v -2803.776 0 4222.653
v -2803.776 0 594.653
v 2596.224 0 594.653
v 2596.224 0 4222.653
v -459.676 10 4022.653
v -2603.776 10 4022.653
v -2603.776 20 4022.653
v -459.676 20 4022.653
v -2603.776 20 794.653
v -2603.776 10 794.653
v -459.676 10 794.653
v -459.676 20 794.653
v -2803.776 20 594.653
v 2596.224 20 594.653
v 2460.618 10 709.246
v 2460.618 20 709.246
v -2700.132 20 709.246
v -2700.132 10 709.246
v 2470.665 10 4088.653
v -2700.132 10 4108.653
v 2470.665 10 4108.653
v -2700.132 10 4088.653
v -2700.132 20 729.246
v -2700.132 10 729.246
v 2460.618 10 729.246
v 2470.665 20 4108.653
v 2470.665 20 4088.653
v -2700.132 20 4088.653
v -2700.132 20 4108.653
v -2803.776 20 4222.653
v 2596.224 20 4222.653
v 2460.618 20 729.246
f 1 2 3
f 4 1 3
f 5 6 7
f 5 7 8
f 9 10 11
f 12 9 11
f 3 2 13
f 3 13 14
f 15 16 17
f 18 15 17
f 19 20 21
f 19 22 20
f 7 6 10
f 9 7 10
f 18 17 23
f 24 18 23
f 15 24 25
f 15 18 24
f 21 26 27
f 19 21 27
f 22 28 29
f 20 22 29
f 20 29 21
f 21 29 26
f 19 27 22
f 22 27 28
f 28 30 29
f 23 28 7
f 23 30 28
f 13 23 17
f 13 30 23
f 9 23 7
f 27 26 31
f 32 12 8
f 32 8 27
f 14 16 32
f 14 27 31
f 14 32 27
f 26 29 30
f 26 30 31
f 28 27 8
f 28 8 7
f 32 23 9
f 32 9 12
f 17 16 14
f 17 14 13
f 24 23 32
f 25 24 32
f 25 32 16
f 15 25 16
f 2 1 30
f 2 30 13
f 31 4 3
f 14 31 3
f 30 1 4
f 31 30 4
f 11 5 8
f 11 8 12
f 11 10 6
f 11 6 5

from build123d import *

# Parameters (mm, degrees)
SKETCH1_W           = 5400
SKETCH1_H           = 3628
SKETCH1_W_2         = 2144.1
SKETCH1_H_2         = 3228
BOSS_EXTRUDE1_DEPTH = 20
SKETCH4_W           = 2144.1
SKETCH4_H           = 3228
BOSS_EXTRUDE2_DEPTH = 10
CUT_EXTRUDE1_DEPTH  = 10


with BuildPart() as part:
    # Sketch1 → Boss-Extrude1 (new body)
    with BuildSketch(Plane(origin=(0, 0, 0), x_dir=(1, 0, 0), z_dir=(0, 1, 0))):
        with Locations((-103.776435045, -2408.652567976)):
            Rectangle(SKETCH1_W, SKETCH1_H)
        with Locations((-1531.726435045, -2408.652567976)):
            Rectangle(SKETCH1_W_2, SKETCH1_H_2, mode=Mode.SUBTRACT)
    extrude(amount=BOSS_EXTRUDE1_DEPTH)

    # Sketch4 → Boss-Extrude2 (add)
    with BuildSketch(Plane(origin=(0, 0, 0), x_dir=(1, 0, 0), z_dir=(0, 1, 0))):
        with Locations((-1531.726435045, -2408.652567976)):
            Rectangle(SKETCH4_W, SKETCH4_H)
    extrude(amount=BOSS_EXTRUDE2_DEPTH)

    # Sketch5 → Cut-Extrude1 (cut)
    with BuildSketch(Plane(origin=(0, 20, 0), x_dir=(1, 0, 0), z_dir=(0, 1, 0))):
        Polygon((-2700.132260169, -718.652567976), (-2700.132260169, -729.245671205), (2460.618113796, -729.245671205), (2460.618113796, -709.245671205), (-2700.132260169, -709.245671205), align=None)
        Polygon((-2700.132260169, -4098.652567976), (-2700.132260169, -4108.652567976), (2470.664759236, -4108.652567976), (2470.664759236, -4088.652567976), (-2700.132260169, -4088.652567976), align=None)
    extrude(amount=-CUT_EXTRUDE1_DEPTH, mode=Mode.SUBTRACT)


solid = part.part
